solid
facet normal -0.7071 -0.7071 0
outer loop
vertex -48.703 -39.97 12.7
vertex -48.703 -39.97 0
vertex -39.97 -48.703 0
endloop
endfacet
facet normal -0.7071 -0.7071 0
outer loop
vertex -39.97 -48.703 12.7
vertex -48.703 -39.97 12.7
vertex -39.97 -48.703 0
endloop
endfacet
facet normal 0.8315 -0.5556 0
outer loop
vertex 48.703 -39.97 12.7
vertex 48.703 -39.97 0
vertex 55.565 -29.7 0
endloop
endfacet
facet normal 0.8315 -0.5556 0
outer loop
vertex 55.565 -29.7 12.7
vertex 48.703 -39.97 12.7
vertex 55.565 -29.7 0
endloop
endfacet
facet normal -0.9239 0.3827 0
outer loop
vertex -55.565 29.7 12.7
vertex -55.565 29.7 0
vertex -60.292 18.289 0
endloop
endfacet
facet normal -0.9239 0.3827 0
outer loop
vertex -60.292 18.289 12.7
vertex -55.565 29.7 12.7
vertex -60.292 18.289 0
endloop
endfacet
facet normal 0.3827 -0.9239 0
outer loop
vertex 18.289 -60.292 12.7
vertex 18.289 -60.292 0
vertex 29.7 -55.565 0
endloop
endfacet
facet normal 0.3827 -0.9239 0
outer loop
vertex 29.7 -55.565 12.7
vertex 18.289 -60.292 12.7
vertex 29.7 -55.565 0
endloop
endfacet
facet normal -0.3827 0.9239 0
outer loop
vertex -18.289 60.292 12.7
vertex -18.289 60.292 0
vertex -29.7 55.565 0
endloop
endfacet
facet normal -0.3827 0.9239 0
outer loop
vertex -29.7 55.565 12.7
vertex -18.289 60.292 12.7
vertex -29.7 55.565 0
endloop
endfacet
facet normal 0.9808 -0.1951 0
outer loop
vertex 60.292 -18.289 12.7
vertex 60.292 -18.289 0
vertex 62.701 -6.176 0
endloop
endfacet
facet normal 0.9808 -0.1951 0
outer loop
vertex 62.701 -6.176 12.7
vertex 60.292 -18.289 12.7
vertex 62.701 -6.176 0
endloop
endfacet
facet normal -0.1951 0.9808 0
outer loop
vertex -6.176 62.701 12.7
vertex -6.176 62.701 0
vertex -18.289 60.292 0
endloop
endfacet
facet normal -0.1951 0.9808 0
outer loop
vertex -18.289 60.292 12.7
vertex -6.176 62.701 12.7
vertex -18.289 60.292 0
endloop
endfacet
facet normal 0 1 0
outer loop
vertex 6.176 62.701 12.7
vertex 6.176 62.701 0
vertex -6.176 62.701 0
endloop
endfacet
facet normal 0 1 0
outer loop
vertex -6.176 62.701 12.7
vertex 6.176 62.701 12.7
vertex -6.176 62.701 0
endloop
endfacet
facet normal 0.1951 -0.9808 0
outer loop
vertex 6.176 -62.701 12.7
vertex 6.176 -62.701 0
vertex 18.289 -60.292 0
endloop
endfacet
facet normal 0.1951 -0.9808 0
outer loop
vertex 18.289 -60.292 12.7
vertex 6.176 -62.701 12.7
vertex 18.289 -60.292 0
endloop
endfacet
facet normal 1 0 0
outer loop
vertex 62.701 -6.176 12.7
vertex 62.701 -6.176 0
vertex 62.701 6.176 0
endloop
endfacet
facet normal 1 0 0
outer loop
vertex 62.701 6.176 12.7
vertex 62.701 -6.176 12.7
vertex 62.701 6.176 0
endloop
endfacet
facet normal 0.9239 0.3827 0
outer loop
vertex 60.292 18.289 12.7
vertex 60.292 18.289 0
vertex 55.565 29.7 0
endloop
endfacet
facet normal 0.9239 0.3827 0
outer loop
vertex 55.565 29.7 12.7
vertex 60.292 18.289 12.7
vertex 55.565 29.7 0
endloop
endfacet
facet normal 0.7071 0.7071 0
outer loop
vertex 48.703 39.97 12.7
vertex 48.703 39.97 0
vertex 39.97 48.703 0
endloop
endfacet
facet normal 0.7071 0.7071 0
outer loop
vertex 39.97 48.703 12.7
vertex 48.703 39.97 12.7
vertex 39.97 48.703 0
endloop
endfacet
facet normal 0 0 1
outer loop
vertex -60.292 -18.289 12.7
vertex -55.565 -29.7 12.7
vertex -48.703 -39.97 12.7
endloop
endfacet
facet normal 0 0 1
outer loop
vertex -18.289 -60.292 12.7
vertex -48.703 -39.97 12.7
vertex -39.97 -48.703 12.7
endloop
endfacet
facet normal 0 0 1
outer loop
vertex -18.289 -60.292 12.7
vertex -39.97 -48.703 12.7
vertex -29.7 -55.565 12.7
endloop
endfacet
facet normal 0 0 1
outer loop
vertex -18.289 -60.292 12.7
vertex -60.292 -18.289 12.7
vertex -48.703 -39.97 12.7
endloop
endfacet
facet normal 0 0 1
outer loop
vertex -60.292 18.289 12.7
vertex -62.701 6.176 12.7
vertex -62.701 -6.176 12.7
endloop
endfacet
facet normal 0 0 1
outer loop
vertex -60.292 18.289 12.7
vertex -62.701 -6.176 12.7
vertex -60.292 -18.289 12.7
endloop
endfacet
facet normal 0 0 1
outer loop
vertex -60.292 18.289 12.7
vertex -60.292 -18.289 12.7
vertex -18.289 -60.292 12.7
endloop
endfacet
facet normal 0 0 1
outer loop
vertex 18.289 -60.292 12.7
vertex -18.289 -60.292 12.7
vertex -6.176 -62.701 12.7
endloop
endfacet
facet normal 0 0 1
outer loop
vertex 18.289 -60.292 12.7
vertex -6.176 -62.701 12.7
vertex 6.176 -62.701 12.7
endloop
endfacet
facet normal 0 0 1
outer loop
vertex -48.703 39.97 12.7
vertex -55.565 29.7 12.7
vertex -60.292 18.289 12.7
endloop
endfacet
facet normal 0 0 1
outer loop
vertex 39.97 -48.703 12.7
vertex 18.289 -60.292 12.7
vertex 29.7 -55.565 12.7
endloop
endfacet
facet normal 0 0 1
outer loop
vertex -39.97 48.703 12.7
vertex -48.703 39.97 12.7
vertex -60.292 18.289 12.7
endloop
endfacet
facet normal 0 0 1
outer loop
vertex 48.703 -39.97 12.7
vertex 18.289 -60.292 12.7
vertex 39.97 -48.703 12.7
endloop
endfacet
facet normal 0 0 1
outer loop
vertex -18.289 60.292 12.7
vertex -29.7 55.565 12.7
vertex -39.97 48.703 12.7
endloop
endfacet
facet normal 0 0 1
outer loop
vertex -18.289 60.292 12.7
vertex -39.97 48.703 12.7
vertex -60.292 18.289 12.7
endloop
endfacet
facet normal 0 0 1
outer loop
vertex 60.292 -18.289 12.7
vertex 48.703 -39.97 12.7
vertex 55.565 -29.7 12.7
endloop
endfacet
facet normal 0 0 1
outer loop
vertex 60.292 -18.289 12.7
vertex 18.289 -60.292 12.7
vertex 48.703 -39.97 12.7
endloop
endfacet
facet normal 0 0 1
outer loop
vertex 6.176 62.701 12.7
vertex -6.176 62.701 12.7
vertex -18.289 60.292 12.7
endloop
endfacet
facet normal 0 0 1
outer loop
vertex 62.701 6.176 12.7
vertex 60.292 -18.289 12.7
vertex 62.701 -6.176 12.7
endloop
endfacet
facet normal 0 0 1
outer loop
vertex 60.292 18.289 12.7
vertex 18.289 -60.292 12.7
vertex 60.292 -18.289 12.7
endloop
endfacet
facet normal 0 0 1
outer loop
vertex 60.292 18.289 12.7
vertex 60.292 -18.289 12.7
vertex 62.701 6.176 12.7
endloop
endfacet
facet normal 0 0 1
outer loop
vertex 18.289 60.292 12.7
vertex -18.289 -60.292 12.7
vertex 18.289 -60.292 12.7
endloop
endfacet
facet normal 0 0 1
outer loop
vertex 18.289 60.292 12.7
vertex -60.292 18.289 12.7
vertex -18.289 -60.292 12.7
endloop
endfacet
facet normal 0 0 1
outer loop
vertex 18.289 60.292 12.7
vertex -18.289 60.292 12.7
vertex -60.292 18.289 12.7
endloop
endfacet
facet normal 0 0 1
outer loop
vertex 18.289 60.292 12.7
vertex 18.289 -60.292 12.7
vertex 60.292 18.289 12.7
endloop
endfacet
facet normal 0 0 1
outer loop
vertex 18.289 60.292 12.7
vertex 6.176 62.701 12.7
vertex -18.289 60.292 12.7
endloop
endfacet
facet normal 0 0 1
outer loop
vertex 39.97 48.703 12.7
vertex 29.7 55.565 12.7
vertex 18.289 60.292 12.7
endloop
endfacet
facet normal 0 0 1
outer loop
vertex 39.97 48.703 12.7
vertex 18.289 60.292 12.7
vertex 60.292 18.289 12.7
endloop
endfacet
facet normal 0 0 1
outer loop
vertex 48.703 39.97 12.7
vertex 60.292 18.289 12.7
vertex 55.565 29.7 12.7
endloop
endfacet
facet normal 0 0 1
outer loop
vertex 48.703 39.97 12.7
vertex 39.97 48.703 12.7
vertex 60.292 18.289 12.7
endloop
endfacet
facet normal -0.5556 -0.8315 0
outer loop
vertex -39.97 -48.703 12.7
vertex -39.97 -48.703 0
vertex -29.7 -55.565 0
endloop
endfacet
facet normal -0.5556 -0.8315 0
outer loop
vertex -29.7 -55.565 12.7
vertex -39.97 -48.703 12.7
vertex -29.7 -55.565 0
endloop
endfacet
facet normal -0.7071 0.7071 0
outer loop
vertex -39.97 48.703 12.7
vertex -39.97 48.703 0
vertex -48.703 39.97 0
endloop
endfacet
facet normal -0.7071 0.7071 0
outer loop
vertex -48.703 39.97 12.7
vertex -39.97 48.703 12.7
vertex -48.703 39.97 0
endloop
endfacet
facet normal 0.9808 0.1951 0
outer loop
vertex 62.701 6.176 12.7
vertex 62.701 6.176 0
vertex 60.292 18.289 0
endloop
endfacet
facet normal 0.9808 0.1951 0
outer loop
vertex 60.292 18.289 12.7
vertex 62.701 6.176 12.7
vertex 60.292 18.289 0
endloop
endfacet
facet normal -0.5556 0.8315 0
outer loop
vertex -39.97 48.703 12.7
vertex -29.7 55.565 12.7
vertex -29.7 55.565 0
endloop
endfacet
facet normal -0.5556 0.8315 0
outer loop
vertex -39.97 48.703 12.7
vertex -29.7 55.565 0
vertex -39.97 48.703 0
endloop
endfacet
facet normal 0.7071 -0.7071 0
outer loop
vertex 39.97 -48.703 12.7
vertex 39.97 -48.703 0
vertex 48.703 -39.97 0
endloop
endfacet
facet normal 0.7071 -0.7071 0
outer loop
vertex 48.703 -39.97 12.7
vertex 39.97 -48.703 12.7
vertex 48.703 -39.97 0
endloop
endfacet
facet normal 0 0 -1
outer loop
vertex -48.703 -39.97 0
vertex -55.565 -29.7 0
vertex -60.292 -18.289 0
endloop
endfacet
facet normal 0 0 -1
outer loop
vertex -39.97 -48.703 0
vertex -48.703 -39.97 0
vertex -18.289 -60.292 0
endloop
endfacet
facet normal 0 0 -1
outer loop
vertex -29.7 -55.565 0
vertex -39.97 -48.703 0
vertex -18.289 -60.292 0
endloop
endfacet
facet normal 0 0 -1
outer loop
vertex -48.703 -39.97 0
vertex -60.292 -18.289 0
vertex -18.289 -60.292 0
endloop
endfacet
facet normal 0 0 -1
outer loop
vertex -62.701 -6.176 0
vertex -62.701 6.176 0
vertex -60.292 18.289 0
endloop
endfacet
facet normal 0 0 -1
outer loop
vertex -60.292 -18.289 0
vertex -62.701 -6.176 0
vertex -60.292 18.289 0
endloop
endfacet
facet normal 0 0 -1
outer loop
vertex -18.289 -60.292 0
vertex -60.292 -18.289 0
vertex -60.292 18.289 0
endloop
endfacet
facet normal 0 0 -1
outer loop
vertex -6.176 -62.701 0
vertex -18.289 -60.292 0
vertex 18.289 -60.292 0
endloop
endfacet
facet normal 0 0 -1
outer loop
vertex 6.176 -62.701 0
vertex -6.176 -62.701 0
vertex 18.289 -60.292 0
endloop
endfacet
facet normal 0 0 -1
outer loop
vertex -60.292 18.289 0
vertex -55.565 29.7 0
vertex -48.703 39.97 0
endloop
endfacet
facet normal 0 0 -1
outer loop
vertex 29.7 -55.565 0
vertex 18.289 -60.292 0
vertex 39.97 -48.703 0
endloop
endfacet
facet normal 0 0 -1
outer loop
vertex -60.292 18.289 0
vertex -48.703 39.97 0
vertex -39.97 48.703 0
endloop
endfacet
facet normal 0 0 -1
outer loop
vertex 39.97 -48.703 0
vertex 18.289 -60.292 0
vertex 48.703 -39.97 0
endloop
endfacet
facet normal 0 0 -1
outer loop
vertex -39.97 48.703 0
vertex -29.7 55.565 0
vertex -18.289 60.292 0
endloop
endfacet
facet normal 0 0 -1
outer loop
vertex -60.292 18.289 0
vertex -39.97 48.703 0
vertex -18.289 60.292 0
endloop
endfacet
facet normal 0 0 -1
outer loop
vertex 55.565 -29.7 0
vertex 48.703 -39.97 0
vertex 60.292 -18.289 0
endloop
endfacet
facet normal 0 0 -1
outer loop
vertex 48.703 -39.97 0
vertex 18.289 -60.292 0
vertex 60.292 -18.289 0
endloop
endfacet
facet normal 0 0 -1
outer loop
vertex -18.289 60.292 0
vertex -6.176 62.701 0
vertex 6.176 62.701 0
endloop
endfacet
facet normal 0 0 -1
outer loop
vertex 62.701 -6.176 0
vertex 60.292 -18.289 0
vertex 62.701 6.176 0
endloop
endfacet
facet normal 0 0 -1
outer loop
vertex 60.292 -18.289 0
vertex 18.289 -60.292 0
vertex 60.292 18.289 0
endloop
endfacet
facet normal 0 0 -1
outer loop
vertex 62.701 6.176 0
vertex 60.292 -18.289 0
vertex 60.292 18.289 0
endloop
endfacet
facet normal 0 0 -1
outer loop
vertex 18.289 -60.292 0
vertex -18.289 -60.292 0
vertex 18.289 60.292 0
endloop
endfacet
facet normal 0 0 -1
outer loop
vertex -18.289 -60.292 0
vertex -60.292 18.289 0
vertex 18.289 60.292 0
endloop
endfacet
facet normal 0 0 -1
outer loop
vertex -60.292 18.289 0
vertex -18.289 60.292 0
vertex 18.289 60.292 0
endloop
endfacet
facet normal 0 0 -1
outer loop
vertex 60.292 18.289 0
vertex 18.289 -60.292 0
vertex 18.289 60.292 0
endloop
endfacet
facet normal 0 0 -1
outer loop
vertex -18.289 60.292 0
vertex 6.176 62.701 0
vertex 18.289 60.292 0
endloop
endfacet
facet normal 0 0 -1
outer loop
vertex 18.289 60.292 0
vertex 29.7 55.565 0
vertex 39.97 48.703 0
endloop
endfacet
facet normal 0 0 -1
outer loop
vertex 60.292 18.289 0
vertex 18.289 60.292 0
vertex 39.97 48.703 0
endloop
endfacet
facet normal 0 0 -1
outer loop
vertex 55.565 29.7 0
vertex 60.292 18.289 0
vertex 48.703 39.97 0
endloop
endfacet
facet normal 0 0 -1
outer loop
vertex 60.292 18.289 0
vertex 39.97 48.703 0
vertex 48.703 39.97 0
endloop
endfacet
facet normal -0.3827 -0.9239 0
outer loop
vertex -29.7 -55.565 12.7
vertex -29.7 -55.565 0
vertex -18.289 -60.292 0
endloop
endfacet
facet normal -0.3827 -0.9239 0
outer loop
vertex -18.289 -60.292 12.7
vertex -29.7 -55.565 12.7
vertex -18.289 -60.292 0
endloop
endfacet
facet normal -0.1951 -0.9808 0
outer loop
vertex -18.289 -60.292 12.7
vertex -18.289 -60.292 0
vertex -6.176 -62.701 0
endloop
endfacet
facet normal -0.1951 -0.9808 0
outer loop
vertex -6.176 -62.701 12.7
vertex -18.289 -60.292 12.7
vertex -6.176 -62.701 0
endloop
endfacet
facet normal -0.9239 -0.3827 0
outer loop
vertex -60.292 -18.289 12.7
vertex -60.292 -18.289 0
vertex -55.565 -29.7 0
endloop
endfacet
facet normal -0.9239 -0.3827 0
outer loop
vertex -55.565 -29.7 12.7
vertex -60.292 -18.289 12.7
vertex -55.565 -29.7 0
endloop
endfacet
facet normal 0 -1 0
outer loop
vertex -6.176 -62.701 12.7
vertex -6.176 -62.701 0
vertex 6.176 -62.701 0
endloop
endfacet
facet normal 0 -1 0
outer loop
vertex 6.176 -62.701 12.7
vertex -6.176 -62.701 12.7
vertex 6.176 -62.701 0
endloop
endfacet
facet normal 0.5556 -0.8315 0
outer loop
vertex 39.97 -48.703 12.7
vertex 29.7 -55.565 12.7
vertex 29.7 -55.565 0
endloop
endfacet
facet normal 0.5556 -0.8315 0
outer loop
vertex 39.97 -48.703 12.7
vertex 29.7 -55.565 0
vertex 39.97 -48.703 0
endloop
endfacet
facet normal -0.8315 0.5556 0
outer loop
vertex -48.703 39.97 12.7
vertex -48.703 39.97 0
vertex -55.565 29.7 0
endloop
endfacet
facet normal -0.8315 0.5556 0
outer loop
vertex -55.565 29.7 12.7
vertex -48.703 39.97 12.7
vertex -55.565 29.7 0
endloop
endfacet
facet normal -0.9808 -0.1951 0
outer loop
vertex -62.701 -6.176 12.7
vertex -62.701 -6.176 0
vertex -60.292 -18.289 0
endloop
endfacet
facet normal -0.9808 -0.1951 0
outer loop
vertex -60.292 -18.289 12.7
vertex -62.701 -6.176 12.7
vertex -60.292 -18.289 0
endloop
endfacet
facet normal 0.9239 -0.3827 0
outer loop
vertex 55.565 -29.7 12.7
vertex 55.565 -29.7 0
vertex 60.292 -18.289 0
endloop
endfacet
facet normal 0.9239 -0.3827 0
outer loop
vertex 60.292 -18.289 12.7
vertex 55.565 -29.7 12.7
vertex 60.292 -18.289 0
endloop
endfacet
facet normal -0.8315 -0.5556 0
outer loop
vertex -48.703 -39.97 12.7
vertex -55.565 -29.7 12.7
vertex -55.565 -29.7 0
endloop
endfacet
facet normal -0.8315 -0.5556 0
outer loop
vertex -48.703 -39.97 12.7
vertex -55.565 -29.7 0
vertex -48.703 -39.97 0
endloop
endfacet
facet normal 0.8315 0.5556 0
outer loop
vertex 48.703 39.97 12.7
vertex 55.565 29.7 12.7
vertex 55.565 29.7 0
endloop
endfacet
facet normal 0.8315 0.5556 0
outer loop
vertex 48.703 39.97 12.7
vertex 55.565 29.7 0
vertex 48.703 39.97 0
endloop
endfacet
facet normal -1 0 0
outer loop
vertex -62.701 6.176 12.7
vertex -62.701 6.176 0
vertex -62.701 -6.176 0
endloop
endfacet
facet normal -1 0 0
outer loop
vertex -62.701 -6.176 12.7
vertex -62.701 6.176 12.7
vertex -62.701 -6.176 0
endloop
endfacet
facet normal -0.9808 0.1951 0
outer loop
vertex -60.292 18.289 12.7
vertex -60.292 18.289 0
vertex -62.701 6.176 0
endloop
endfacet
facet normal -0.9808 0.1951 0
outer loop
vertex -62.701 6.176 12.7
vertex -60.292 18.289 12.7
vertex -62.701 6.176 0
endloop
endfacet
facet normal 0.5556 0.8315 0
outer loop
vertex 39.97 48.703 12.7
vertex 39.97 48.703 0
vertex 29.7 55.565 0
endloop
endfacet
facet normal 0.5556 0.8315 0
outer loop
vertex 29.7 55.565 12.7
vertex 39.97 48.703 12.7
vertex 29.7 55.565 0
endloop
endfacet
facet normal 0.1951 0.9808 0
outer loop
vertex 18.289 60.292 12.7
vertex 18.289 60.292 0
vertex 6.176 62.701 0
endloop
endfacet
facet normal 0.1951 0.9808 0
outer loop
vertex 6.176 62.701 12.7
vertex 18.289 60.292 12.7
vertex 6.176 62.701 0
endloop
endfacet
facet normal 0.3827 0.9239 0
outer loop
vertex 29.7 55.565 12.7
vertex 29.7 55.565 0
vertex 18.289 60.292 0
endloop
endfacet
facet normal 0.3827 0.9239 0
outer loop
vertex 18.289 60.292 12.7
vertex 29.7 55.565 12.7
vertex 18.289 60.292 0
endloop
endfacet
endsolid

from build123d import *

# Parameters (mm, degrees)
F1_DEPTH = 12.7


with BuildPart() as f1:
    # F0 (on Top) → F1 (new body)
    with BuildSketch(Plane.XY):
        Polygon((6.17555, -62.701412), (18.289327, -60.291831), (16.85737, -55.571301), (5.692037, -57.792224), align=None)
        Polygon((-44.890152, -36.840395), (-48.703367, -39.96982), (-39.96982, -48.703367), (-36.840395, -44.890152), align=None)
        Polygon((-55.571301, -16.85737), (-60.291831, -18.289327), (-55.56527, -29.700256), (-51.214805, -27.374883), align=None)
        Polygon((5.692037, 57.792224), (-5.692037, 57.792224), (-16.85737, 55.571301), (-27.374883, 51.214805), (-36.840395, 44.890152), (-44.890152, 36.840395), (-51.214805, 27.374883), (-55.571301, 16.85737), (-57.792224, 5.692037), (-57.792224, -5.692037), (-55.571301, -16.85737), (-51.214805, -27.374883), (-44.890152, -36.840395), (-36.840395, -44.890152), (-27.374883, -51.214805), (-16.85737, -55.571301), (-5.692037, -57.792224), (5.692037, -57.792224), (16.85737, -55.571301), (27.374883, -51.214805), (36.840395, -44.890152), (44.890152, -36.840395), (51.214805, -27.374883), (55.571301, -16.85737), (57.792224, -5.692037), (57.792224, 5.692037), (55.571301, 16.85737), (51.214805, 27.374883), (44.890152, 36.840395), (36.840395, 44.890152), (27.374883, 51.214805), (16.85737, 55.571301), align=None)
        Polygon((62.701412, -6.17555), (62.701412, 6.17555), (57.792224, 5.692037), (57.792224, -5.692037), align=None)
        Polygon((60.291831, -18.289327), (62.701412, -6.17555), (57.792224, -5.692037), (55.571301, -16.85737), align=None)
        Polygon((-27.374883, -51.214805), (-29.700256, -55.56527), (-18.289327, -60.291831), (-16.85737, -55.571301), align=None)
        Polygon((55.56527, -29.700256), (60.291831, -18.289327), (55.571301, -16.85737), (51.214805, -27.374883), align=None)
        Polygon((18.289327, 60.291831), (6.17555, 62.701412), (5.692037, 57.792224), (16.85737, 55.571301), align=None)
        Polygon((29.700256, 55.56527), (18.289327, 60.291831), (16.85737, 55.571301), (27.374883, 51.214805), align=None)
        Polygon((-57.792224, 5.692037), (-62.701412, 6.17555), (-62.701412, -6.17555), (-57.792224, -5.692037), align=None)
        Polygon((-57.792224, -5.692037), (-62.701412, -6.17555), (-60.291831, -18.289327), (-55.571301, -16.85737), align=None)
        Polygon((-36.840395, 44.890152), (-39.96982, 48.703367), (-48.703367, 39.96982), (-44.890152, 36.840395), align=None)
        Polygon((-27.374883, 51.214805), (-29.700256, 55.56527), (-39.96982, 48.703367), (-36.840395, 44.890152), align=None)
        Polygon((48.703367, 39.96982), (39.96982, 48.703367), (36.840395, 44.890152), (44.890152, 36.840395), align=None)
        Polygon((-16.85737, 55.571301), (-18.289327, 60.291831), (-29.700256, 55.56527), (-27.374883, 51.214805), align=None)
        Polygon((-36.840395, -44.890152), (-39.96982, -48.703367), (-29.700256, -55.56527), (-27.374883, -51.214805), align=None)
        Polygon((39.96982, 48.703367), (29.700256, 55.56527), (27.374883, 51.214805), (36.840395, 44.890152), align=None)
        Polygon((29.700256, -55.56527), (39.96982, -48.703367), (36.840395, -44.890152), (27.374883, -51.214805), align=None)
        Polygon((-51.214805, -27.374883), (-55.56527, -29.700256), (-48.703367, -39.96982), (-44.890152, -36.840395), align=None)
        Polygon((-5.692037, -57.792224), (-6.17555, -62.701412), (6.17555, -62.701412), (5.692037, -57.792224), align=None)
        Polygon((48.703367, -39.96982), (55.56527, -29.700256), (51.214805, -27.374883), (44.890152, -36.840395), align=None)
        Polygon((18.289327, -60.291831), (29.700256, -55.56527), (27.374883, -51.214805), (16.85737, -55.571301), align=None)
        Polygon((39.96982, -48.703367), (48.703367, -39.96982), (44.890152, -36.840395), (36.840395, -44.890152), align=None)
        Polygon((6.17555, 62.701412), (-6.17555, 62.701412), (-5.692037, 57.792224), (5.692037, 57.792224), align=None)
        Polygon((-51.214805, 27.374883), (-55.56527, 29.700256), (-60.291831, 18.289327), (-55.571301, 16.85737), align=None)
        Polygon((55.56527, 29.700256), (48.703367, 39.96982), (44.890152, 36.840395), (51.214805, 27.374883), align=None)
        Polygon((-5.692037, 57.792224), (-6.17555, 62.701412), (-18.289327, 60.291831), (-16.85737, 55.571301), align=None)
        Polygon((-55.571301, 16.85737), (-60.291831, 18.289327), (-62.701412, 6.17555), (-57.792224, 5.692037), align=None)
        Polygon((60.291831, 18.289327), (55.56527, 29.700256), (51.214805, 27.374883), (55.571301, 16.85737), align=None)
        Polygon((62.701412, 6.17555), (60.291831, 18.289327), (55.571301, 16.85737), (57.792224, 5.692037), align=None)
        Polygon((-44.890152, 36.840395), (-48.703367, 39.96982), (-55.56527, 29.700256), (-51.214805, 27.374883), align=None)
        Polygon((-16.85737, -55.571301), (-18.289327, -60.291831), (-6.17555, -62.701412), (-5.692037, -57.792224), align=None)
    extrude(amount=F1_DEPTH)


solid = f1.part
